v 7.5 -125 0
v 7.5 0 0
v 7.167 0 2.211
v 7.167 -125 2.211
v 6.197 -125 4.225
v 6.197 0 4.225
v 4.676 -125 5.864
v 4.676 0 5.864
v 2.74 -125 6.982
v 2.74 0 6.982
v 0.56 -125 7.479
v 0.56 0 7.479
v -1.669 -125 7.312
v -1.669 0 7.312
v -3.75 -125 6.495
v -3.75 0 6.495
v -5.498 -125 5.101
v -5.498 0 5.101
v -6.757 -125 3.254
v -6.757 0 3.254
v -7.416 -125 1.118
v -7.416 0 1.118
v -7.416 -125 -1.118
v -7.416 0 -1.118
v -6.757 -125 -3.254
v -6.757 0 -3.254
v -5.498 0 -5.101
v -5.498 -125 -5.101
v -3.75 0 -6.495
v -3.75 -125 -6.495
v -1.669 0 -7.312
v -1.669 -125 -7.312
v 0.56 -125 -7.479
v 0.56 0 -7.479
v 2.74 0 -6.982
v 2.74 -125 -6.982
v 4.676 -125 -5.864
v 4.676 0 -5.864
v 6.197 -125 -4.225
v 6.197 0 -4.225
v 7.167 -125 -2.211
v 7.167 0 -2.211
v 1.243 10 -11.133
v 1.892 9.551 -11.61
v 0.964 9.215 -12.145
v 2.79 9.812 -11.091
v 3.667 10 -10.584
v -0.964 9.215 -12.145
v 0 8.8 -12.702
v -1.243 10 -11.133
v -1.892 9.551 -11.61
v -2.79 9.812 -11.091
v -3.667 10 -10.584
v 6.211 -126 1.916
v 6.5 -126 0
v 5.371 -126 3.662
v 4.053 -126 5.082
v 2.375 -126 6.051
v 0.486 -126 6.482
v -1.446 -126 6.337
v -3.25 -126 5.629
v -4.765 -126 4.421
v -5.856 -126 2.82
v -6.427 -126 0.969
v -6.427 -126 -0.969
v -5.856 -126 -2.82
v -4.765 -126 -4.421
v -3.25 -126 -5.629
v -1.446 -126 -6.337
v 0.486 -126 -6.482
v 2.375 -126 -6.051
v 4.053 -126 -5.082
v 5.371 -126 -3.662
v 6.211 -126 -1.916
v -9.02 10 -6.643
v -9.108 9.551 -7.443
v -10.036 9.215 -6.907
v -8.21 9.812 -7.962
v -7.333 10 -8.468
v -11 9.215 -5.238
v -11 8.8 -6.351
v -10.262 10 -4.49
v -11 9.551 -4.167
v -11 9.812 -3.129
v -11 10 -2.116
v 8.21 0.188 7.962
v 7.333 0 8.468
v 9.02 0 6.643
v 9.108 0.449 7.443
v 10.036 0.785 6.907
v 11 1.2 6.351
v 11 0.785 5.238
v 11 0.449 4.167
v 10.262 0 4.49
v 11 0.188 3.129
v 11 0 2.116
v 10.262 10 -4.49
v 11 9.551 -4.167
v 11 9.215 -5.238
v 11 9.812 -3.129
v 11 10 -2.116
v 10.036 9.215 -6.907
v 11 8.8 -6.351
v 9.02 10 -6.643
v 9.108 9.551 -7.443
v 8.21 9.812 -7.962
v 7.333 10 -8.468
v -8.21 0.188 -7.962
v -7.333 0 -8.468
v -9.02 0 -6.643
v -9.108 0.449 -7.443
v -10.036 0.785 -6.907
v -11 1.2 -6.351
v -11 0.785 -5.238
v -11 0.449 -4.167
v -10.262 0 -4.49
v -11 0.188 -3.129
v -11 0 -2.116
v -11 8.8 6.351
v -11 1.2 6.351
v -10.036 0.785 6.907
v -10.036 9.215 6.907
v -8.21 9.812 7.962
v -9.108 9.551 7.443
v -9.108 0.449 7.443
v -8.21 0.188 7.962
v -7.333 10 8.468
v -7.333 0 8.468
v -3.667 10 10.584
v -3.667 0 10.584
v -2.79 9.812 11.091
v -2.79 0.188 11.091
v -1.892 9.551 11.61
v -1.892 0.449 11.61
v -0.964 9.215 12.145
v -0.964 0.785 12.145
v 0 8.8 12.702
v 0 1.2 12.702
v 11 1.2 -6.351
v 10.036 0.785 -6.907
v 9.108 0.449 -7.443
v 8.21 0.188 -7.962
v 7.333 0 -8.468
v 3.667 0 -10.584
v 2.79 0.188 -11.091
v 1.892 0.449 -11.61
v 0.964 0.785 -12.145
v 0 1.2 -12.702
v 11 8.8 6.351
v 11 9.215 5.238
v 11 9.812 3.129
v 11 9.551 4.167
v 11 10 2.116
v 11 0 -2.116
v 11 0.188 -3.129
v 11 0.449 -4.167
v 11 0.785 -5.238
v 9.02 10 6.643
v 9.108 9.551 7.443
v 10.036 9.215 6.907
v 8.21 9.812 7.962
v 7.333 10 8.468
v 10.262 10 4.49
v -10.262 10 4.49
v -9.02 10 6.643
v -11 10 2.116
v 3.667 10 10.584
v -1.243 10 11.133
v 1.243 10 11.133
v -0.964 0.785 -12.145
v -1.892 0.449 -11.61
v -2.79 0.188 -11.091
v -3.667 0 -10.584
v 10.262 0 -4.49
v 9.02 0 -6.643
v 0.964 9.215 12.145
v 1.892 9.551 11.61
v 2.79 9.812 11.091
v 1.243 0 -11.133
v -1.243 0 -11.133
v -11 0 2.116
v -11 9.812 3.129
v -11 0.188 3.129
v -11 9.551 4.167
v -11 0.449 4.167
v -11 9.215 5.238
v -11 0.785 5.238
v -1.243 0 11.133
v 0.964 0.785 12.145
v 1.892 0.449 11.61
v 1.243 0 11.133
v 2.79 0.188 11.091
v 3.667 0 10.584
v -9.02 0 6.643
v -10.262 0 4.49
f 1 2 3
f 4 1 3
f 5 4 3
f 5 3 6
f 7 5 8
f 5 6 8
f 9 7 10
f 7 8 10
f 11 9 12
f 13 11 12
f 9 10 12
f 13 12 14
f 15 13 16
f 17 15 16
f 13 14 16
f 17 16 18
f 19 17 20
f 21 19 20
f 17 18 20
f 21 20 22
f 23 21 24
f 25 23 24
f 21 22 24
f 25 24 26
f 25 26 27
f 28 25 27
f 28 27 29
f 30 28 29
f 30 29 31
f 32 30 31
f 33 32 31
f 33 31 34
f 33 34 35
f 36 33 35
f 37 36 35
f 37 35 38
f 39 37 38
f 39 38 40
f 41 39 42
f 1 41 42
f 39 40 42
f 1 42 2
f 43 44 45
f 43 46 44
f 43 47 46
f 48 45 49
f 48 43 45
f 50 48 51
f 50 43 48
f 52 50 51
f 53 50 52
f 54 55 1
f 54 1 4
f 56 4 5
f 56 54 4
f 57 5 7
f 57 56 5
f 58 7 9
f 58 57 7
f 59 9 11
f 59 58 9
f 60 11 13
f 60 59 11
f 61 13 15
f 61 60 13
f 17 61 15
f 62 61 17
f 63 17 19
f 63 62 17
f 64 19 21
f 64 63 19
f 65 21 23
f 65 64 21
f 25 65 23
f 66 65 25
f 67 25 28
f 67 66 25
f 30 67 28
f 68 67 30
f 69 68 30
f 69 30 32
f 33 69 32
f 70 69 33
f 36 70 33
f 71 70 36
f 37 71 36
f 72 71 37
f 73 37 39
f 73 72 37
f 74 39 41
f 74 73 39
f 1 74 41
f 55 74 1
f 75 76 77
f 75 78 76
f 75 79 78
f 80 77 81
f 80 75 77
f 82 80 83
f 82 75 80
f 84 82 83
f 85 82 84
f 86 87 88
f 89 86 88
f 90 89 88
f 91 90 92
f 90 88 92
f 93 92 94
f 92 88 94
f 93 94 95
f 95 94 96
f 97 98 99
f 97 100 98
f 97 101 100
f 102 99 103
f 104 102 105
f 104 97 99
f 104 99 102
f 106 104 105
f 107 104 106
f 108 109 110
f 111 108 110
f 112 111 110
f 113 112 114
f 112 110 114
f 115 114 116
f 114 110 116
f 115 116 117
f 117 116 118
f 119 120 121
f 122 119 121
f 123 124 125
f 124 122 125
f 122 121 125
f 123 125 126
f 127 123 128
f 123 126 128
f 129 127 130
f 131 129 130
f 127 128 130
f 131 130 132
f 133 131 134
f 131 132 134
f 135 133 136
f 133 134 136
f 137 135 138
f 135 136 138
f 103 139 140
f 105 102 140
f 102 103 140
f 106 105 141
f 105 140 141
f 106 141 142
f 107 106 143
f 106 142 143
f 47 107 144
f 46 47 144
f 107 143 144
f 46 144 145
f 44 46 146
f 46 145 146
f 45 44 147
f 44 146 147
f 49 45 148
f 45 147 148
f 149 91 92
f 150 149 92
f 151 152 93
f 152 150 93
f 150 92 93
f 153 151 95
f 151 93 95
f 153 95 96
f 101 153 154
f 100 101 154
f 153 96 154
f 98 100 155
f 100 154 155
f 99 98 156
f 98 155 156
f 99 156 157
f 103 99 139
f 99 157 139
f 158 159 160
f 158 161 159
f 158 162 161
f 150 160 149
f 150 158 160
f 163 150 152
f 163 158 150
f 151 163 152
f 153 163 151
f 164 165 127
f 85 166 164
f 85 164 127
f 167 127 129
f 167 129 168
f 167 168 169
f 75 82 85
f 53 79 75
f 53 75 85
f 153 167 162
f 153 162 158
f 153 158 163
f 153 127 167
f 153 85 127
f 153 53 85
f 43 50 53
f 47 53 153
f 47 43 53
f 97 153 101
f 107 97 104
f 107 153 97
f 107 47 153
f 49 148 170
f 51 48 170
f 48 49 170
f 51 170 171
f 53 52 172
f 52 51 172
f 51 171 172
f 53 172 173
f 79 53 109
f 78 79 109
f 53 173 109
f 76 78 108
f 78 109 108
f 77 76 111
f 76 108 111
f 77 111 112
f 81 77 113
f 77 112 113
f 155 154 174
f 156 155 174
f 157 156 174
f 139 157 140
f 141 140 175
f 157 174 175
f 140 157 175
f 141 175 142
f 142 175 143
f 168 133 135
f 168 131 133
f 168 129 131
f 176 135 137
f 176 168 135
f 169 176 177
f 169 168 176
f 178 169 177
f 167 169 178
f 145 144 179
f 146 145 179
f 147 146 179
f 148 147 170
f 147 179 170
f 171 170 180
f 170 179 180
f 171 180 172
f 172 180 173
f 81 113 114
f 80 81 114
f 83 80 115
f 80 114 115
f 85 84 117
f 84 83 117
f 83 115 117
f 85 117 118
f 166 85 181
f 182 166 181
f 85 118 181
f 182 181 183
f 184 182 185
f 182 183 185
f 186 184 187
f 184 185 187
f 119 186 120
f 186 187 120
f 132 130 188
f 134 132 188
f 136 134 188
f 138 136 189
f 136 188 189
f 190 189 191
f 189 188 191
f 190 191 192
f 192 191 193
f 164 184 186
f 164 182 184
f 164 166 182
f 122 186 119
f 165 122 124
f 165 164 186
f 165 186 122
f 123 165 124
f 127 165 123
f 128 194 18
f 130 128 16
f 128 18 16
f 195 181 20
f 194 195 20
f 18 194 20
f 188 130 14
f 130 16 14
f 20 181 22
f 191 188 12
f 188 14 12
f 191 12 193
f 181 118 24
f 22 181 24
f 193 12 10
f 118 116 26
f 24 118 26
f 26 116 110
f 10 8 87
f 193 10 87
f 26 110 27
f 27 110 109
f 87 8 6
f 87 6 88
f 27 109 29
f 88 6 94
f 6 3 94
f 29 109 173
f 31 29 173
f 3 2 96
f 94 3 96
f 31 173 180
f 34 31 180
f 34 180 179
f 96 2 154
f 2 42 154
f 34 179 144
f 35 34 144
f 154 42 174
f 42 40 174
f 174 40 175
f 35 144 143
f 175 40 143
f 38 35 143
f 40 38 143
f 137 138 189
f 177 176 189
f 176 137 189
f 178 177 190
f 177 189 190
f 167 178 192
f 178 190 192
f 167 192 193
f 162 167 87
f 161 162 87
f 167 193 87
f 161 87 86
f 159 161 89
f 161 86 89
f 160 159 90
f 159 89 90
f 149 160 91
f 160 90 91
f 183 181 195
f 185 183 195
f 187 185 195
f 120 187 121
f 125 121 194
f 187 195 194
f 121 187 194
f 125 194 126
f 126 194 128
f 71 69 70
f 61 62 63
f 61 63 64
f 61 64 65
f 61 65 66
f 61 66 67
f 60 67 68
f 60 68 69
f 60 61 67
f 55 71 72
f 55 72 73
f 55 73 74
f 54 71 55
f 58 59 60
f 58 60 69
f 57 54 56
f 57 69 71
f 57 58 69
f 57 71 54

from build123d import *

# Parameters (mm, degrees)
BOSS_EXTRUDE1_DEPTH = 10
SKETCH2_R           = 7.5
BOSS_EXTRUDE2_DEPTH = 126
CHAMFER1_SIZE       = 1


with BuildPart() as part:
    # Sketch1 → Boss-Extrude1 (new body)
    with BuildSketch(Plane(origin=(0, 0, 0), x_dir=(1, 0, 0), z_dir=(0, 1, 0))):
        Polygon((0, 12.701705922), (-11, 6.350852961), (-11, -6.350852961), (0, -12.701705922), (11, -6.350852961), (11, 6.350852961), align=None)
    extrude(amount=BOSS_EXTRUDE1_DEPTH)

    # Sketch2 → Boss-Extrude2 (add)
    with BuildSketch(Plane.XZ):
        Circle(SKETCH2_R)
    extrude(amount=BOSS_EXTRUDE2_DEPTH)

    # Sketch4 → Cut-Revolve2 (revolve, cut)
    with BuildSketch(Plane(origin=(0, 0, 0), x_dir=(0, 0, -1), z_dir=(1, 0, 0))):
        Polygon((-12.701705922, 10), (-12.701705922, 8.8), (-11.201705922, 10), align=None)
        Polygon((-12.701705922, 0), (-12.701705922, 1.2), (-11.201705922, 0), align=None)
    revolve(axis=Axis((0, 0, 0), (0, 1, 0)), mode=Mode.SUBTRACT)

    # Chamfer1
    chamfer1_edges = [part.edges().sort_by_distance(p)[0] for p in [
        (-7.5, -126, 0),
    ]]
    chamfer(chamfer1_edges, length=CHAMFER1_SIZE)


solid = part.part
